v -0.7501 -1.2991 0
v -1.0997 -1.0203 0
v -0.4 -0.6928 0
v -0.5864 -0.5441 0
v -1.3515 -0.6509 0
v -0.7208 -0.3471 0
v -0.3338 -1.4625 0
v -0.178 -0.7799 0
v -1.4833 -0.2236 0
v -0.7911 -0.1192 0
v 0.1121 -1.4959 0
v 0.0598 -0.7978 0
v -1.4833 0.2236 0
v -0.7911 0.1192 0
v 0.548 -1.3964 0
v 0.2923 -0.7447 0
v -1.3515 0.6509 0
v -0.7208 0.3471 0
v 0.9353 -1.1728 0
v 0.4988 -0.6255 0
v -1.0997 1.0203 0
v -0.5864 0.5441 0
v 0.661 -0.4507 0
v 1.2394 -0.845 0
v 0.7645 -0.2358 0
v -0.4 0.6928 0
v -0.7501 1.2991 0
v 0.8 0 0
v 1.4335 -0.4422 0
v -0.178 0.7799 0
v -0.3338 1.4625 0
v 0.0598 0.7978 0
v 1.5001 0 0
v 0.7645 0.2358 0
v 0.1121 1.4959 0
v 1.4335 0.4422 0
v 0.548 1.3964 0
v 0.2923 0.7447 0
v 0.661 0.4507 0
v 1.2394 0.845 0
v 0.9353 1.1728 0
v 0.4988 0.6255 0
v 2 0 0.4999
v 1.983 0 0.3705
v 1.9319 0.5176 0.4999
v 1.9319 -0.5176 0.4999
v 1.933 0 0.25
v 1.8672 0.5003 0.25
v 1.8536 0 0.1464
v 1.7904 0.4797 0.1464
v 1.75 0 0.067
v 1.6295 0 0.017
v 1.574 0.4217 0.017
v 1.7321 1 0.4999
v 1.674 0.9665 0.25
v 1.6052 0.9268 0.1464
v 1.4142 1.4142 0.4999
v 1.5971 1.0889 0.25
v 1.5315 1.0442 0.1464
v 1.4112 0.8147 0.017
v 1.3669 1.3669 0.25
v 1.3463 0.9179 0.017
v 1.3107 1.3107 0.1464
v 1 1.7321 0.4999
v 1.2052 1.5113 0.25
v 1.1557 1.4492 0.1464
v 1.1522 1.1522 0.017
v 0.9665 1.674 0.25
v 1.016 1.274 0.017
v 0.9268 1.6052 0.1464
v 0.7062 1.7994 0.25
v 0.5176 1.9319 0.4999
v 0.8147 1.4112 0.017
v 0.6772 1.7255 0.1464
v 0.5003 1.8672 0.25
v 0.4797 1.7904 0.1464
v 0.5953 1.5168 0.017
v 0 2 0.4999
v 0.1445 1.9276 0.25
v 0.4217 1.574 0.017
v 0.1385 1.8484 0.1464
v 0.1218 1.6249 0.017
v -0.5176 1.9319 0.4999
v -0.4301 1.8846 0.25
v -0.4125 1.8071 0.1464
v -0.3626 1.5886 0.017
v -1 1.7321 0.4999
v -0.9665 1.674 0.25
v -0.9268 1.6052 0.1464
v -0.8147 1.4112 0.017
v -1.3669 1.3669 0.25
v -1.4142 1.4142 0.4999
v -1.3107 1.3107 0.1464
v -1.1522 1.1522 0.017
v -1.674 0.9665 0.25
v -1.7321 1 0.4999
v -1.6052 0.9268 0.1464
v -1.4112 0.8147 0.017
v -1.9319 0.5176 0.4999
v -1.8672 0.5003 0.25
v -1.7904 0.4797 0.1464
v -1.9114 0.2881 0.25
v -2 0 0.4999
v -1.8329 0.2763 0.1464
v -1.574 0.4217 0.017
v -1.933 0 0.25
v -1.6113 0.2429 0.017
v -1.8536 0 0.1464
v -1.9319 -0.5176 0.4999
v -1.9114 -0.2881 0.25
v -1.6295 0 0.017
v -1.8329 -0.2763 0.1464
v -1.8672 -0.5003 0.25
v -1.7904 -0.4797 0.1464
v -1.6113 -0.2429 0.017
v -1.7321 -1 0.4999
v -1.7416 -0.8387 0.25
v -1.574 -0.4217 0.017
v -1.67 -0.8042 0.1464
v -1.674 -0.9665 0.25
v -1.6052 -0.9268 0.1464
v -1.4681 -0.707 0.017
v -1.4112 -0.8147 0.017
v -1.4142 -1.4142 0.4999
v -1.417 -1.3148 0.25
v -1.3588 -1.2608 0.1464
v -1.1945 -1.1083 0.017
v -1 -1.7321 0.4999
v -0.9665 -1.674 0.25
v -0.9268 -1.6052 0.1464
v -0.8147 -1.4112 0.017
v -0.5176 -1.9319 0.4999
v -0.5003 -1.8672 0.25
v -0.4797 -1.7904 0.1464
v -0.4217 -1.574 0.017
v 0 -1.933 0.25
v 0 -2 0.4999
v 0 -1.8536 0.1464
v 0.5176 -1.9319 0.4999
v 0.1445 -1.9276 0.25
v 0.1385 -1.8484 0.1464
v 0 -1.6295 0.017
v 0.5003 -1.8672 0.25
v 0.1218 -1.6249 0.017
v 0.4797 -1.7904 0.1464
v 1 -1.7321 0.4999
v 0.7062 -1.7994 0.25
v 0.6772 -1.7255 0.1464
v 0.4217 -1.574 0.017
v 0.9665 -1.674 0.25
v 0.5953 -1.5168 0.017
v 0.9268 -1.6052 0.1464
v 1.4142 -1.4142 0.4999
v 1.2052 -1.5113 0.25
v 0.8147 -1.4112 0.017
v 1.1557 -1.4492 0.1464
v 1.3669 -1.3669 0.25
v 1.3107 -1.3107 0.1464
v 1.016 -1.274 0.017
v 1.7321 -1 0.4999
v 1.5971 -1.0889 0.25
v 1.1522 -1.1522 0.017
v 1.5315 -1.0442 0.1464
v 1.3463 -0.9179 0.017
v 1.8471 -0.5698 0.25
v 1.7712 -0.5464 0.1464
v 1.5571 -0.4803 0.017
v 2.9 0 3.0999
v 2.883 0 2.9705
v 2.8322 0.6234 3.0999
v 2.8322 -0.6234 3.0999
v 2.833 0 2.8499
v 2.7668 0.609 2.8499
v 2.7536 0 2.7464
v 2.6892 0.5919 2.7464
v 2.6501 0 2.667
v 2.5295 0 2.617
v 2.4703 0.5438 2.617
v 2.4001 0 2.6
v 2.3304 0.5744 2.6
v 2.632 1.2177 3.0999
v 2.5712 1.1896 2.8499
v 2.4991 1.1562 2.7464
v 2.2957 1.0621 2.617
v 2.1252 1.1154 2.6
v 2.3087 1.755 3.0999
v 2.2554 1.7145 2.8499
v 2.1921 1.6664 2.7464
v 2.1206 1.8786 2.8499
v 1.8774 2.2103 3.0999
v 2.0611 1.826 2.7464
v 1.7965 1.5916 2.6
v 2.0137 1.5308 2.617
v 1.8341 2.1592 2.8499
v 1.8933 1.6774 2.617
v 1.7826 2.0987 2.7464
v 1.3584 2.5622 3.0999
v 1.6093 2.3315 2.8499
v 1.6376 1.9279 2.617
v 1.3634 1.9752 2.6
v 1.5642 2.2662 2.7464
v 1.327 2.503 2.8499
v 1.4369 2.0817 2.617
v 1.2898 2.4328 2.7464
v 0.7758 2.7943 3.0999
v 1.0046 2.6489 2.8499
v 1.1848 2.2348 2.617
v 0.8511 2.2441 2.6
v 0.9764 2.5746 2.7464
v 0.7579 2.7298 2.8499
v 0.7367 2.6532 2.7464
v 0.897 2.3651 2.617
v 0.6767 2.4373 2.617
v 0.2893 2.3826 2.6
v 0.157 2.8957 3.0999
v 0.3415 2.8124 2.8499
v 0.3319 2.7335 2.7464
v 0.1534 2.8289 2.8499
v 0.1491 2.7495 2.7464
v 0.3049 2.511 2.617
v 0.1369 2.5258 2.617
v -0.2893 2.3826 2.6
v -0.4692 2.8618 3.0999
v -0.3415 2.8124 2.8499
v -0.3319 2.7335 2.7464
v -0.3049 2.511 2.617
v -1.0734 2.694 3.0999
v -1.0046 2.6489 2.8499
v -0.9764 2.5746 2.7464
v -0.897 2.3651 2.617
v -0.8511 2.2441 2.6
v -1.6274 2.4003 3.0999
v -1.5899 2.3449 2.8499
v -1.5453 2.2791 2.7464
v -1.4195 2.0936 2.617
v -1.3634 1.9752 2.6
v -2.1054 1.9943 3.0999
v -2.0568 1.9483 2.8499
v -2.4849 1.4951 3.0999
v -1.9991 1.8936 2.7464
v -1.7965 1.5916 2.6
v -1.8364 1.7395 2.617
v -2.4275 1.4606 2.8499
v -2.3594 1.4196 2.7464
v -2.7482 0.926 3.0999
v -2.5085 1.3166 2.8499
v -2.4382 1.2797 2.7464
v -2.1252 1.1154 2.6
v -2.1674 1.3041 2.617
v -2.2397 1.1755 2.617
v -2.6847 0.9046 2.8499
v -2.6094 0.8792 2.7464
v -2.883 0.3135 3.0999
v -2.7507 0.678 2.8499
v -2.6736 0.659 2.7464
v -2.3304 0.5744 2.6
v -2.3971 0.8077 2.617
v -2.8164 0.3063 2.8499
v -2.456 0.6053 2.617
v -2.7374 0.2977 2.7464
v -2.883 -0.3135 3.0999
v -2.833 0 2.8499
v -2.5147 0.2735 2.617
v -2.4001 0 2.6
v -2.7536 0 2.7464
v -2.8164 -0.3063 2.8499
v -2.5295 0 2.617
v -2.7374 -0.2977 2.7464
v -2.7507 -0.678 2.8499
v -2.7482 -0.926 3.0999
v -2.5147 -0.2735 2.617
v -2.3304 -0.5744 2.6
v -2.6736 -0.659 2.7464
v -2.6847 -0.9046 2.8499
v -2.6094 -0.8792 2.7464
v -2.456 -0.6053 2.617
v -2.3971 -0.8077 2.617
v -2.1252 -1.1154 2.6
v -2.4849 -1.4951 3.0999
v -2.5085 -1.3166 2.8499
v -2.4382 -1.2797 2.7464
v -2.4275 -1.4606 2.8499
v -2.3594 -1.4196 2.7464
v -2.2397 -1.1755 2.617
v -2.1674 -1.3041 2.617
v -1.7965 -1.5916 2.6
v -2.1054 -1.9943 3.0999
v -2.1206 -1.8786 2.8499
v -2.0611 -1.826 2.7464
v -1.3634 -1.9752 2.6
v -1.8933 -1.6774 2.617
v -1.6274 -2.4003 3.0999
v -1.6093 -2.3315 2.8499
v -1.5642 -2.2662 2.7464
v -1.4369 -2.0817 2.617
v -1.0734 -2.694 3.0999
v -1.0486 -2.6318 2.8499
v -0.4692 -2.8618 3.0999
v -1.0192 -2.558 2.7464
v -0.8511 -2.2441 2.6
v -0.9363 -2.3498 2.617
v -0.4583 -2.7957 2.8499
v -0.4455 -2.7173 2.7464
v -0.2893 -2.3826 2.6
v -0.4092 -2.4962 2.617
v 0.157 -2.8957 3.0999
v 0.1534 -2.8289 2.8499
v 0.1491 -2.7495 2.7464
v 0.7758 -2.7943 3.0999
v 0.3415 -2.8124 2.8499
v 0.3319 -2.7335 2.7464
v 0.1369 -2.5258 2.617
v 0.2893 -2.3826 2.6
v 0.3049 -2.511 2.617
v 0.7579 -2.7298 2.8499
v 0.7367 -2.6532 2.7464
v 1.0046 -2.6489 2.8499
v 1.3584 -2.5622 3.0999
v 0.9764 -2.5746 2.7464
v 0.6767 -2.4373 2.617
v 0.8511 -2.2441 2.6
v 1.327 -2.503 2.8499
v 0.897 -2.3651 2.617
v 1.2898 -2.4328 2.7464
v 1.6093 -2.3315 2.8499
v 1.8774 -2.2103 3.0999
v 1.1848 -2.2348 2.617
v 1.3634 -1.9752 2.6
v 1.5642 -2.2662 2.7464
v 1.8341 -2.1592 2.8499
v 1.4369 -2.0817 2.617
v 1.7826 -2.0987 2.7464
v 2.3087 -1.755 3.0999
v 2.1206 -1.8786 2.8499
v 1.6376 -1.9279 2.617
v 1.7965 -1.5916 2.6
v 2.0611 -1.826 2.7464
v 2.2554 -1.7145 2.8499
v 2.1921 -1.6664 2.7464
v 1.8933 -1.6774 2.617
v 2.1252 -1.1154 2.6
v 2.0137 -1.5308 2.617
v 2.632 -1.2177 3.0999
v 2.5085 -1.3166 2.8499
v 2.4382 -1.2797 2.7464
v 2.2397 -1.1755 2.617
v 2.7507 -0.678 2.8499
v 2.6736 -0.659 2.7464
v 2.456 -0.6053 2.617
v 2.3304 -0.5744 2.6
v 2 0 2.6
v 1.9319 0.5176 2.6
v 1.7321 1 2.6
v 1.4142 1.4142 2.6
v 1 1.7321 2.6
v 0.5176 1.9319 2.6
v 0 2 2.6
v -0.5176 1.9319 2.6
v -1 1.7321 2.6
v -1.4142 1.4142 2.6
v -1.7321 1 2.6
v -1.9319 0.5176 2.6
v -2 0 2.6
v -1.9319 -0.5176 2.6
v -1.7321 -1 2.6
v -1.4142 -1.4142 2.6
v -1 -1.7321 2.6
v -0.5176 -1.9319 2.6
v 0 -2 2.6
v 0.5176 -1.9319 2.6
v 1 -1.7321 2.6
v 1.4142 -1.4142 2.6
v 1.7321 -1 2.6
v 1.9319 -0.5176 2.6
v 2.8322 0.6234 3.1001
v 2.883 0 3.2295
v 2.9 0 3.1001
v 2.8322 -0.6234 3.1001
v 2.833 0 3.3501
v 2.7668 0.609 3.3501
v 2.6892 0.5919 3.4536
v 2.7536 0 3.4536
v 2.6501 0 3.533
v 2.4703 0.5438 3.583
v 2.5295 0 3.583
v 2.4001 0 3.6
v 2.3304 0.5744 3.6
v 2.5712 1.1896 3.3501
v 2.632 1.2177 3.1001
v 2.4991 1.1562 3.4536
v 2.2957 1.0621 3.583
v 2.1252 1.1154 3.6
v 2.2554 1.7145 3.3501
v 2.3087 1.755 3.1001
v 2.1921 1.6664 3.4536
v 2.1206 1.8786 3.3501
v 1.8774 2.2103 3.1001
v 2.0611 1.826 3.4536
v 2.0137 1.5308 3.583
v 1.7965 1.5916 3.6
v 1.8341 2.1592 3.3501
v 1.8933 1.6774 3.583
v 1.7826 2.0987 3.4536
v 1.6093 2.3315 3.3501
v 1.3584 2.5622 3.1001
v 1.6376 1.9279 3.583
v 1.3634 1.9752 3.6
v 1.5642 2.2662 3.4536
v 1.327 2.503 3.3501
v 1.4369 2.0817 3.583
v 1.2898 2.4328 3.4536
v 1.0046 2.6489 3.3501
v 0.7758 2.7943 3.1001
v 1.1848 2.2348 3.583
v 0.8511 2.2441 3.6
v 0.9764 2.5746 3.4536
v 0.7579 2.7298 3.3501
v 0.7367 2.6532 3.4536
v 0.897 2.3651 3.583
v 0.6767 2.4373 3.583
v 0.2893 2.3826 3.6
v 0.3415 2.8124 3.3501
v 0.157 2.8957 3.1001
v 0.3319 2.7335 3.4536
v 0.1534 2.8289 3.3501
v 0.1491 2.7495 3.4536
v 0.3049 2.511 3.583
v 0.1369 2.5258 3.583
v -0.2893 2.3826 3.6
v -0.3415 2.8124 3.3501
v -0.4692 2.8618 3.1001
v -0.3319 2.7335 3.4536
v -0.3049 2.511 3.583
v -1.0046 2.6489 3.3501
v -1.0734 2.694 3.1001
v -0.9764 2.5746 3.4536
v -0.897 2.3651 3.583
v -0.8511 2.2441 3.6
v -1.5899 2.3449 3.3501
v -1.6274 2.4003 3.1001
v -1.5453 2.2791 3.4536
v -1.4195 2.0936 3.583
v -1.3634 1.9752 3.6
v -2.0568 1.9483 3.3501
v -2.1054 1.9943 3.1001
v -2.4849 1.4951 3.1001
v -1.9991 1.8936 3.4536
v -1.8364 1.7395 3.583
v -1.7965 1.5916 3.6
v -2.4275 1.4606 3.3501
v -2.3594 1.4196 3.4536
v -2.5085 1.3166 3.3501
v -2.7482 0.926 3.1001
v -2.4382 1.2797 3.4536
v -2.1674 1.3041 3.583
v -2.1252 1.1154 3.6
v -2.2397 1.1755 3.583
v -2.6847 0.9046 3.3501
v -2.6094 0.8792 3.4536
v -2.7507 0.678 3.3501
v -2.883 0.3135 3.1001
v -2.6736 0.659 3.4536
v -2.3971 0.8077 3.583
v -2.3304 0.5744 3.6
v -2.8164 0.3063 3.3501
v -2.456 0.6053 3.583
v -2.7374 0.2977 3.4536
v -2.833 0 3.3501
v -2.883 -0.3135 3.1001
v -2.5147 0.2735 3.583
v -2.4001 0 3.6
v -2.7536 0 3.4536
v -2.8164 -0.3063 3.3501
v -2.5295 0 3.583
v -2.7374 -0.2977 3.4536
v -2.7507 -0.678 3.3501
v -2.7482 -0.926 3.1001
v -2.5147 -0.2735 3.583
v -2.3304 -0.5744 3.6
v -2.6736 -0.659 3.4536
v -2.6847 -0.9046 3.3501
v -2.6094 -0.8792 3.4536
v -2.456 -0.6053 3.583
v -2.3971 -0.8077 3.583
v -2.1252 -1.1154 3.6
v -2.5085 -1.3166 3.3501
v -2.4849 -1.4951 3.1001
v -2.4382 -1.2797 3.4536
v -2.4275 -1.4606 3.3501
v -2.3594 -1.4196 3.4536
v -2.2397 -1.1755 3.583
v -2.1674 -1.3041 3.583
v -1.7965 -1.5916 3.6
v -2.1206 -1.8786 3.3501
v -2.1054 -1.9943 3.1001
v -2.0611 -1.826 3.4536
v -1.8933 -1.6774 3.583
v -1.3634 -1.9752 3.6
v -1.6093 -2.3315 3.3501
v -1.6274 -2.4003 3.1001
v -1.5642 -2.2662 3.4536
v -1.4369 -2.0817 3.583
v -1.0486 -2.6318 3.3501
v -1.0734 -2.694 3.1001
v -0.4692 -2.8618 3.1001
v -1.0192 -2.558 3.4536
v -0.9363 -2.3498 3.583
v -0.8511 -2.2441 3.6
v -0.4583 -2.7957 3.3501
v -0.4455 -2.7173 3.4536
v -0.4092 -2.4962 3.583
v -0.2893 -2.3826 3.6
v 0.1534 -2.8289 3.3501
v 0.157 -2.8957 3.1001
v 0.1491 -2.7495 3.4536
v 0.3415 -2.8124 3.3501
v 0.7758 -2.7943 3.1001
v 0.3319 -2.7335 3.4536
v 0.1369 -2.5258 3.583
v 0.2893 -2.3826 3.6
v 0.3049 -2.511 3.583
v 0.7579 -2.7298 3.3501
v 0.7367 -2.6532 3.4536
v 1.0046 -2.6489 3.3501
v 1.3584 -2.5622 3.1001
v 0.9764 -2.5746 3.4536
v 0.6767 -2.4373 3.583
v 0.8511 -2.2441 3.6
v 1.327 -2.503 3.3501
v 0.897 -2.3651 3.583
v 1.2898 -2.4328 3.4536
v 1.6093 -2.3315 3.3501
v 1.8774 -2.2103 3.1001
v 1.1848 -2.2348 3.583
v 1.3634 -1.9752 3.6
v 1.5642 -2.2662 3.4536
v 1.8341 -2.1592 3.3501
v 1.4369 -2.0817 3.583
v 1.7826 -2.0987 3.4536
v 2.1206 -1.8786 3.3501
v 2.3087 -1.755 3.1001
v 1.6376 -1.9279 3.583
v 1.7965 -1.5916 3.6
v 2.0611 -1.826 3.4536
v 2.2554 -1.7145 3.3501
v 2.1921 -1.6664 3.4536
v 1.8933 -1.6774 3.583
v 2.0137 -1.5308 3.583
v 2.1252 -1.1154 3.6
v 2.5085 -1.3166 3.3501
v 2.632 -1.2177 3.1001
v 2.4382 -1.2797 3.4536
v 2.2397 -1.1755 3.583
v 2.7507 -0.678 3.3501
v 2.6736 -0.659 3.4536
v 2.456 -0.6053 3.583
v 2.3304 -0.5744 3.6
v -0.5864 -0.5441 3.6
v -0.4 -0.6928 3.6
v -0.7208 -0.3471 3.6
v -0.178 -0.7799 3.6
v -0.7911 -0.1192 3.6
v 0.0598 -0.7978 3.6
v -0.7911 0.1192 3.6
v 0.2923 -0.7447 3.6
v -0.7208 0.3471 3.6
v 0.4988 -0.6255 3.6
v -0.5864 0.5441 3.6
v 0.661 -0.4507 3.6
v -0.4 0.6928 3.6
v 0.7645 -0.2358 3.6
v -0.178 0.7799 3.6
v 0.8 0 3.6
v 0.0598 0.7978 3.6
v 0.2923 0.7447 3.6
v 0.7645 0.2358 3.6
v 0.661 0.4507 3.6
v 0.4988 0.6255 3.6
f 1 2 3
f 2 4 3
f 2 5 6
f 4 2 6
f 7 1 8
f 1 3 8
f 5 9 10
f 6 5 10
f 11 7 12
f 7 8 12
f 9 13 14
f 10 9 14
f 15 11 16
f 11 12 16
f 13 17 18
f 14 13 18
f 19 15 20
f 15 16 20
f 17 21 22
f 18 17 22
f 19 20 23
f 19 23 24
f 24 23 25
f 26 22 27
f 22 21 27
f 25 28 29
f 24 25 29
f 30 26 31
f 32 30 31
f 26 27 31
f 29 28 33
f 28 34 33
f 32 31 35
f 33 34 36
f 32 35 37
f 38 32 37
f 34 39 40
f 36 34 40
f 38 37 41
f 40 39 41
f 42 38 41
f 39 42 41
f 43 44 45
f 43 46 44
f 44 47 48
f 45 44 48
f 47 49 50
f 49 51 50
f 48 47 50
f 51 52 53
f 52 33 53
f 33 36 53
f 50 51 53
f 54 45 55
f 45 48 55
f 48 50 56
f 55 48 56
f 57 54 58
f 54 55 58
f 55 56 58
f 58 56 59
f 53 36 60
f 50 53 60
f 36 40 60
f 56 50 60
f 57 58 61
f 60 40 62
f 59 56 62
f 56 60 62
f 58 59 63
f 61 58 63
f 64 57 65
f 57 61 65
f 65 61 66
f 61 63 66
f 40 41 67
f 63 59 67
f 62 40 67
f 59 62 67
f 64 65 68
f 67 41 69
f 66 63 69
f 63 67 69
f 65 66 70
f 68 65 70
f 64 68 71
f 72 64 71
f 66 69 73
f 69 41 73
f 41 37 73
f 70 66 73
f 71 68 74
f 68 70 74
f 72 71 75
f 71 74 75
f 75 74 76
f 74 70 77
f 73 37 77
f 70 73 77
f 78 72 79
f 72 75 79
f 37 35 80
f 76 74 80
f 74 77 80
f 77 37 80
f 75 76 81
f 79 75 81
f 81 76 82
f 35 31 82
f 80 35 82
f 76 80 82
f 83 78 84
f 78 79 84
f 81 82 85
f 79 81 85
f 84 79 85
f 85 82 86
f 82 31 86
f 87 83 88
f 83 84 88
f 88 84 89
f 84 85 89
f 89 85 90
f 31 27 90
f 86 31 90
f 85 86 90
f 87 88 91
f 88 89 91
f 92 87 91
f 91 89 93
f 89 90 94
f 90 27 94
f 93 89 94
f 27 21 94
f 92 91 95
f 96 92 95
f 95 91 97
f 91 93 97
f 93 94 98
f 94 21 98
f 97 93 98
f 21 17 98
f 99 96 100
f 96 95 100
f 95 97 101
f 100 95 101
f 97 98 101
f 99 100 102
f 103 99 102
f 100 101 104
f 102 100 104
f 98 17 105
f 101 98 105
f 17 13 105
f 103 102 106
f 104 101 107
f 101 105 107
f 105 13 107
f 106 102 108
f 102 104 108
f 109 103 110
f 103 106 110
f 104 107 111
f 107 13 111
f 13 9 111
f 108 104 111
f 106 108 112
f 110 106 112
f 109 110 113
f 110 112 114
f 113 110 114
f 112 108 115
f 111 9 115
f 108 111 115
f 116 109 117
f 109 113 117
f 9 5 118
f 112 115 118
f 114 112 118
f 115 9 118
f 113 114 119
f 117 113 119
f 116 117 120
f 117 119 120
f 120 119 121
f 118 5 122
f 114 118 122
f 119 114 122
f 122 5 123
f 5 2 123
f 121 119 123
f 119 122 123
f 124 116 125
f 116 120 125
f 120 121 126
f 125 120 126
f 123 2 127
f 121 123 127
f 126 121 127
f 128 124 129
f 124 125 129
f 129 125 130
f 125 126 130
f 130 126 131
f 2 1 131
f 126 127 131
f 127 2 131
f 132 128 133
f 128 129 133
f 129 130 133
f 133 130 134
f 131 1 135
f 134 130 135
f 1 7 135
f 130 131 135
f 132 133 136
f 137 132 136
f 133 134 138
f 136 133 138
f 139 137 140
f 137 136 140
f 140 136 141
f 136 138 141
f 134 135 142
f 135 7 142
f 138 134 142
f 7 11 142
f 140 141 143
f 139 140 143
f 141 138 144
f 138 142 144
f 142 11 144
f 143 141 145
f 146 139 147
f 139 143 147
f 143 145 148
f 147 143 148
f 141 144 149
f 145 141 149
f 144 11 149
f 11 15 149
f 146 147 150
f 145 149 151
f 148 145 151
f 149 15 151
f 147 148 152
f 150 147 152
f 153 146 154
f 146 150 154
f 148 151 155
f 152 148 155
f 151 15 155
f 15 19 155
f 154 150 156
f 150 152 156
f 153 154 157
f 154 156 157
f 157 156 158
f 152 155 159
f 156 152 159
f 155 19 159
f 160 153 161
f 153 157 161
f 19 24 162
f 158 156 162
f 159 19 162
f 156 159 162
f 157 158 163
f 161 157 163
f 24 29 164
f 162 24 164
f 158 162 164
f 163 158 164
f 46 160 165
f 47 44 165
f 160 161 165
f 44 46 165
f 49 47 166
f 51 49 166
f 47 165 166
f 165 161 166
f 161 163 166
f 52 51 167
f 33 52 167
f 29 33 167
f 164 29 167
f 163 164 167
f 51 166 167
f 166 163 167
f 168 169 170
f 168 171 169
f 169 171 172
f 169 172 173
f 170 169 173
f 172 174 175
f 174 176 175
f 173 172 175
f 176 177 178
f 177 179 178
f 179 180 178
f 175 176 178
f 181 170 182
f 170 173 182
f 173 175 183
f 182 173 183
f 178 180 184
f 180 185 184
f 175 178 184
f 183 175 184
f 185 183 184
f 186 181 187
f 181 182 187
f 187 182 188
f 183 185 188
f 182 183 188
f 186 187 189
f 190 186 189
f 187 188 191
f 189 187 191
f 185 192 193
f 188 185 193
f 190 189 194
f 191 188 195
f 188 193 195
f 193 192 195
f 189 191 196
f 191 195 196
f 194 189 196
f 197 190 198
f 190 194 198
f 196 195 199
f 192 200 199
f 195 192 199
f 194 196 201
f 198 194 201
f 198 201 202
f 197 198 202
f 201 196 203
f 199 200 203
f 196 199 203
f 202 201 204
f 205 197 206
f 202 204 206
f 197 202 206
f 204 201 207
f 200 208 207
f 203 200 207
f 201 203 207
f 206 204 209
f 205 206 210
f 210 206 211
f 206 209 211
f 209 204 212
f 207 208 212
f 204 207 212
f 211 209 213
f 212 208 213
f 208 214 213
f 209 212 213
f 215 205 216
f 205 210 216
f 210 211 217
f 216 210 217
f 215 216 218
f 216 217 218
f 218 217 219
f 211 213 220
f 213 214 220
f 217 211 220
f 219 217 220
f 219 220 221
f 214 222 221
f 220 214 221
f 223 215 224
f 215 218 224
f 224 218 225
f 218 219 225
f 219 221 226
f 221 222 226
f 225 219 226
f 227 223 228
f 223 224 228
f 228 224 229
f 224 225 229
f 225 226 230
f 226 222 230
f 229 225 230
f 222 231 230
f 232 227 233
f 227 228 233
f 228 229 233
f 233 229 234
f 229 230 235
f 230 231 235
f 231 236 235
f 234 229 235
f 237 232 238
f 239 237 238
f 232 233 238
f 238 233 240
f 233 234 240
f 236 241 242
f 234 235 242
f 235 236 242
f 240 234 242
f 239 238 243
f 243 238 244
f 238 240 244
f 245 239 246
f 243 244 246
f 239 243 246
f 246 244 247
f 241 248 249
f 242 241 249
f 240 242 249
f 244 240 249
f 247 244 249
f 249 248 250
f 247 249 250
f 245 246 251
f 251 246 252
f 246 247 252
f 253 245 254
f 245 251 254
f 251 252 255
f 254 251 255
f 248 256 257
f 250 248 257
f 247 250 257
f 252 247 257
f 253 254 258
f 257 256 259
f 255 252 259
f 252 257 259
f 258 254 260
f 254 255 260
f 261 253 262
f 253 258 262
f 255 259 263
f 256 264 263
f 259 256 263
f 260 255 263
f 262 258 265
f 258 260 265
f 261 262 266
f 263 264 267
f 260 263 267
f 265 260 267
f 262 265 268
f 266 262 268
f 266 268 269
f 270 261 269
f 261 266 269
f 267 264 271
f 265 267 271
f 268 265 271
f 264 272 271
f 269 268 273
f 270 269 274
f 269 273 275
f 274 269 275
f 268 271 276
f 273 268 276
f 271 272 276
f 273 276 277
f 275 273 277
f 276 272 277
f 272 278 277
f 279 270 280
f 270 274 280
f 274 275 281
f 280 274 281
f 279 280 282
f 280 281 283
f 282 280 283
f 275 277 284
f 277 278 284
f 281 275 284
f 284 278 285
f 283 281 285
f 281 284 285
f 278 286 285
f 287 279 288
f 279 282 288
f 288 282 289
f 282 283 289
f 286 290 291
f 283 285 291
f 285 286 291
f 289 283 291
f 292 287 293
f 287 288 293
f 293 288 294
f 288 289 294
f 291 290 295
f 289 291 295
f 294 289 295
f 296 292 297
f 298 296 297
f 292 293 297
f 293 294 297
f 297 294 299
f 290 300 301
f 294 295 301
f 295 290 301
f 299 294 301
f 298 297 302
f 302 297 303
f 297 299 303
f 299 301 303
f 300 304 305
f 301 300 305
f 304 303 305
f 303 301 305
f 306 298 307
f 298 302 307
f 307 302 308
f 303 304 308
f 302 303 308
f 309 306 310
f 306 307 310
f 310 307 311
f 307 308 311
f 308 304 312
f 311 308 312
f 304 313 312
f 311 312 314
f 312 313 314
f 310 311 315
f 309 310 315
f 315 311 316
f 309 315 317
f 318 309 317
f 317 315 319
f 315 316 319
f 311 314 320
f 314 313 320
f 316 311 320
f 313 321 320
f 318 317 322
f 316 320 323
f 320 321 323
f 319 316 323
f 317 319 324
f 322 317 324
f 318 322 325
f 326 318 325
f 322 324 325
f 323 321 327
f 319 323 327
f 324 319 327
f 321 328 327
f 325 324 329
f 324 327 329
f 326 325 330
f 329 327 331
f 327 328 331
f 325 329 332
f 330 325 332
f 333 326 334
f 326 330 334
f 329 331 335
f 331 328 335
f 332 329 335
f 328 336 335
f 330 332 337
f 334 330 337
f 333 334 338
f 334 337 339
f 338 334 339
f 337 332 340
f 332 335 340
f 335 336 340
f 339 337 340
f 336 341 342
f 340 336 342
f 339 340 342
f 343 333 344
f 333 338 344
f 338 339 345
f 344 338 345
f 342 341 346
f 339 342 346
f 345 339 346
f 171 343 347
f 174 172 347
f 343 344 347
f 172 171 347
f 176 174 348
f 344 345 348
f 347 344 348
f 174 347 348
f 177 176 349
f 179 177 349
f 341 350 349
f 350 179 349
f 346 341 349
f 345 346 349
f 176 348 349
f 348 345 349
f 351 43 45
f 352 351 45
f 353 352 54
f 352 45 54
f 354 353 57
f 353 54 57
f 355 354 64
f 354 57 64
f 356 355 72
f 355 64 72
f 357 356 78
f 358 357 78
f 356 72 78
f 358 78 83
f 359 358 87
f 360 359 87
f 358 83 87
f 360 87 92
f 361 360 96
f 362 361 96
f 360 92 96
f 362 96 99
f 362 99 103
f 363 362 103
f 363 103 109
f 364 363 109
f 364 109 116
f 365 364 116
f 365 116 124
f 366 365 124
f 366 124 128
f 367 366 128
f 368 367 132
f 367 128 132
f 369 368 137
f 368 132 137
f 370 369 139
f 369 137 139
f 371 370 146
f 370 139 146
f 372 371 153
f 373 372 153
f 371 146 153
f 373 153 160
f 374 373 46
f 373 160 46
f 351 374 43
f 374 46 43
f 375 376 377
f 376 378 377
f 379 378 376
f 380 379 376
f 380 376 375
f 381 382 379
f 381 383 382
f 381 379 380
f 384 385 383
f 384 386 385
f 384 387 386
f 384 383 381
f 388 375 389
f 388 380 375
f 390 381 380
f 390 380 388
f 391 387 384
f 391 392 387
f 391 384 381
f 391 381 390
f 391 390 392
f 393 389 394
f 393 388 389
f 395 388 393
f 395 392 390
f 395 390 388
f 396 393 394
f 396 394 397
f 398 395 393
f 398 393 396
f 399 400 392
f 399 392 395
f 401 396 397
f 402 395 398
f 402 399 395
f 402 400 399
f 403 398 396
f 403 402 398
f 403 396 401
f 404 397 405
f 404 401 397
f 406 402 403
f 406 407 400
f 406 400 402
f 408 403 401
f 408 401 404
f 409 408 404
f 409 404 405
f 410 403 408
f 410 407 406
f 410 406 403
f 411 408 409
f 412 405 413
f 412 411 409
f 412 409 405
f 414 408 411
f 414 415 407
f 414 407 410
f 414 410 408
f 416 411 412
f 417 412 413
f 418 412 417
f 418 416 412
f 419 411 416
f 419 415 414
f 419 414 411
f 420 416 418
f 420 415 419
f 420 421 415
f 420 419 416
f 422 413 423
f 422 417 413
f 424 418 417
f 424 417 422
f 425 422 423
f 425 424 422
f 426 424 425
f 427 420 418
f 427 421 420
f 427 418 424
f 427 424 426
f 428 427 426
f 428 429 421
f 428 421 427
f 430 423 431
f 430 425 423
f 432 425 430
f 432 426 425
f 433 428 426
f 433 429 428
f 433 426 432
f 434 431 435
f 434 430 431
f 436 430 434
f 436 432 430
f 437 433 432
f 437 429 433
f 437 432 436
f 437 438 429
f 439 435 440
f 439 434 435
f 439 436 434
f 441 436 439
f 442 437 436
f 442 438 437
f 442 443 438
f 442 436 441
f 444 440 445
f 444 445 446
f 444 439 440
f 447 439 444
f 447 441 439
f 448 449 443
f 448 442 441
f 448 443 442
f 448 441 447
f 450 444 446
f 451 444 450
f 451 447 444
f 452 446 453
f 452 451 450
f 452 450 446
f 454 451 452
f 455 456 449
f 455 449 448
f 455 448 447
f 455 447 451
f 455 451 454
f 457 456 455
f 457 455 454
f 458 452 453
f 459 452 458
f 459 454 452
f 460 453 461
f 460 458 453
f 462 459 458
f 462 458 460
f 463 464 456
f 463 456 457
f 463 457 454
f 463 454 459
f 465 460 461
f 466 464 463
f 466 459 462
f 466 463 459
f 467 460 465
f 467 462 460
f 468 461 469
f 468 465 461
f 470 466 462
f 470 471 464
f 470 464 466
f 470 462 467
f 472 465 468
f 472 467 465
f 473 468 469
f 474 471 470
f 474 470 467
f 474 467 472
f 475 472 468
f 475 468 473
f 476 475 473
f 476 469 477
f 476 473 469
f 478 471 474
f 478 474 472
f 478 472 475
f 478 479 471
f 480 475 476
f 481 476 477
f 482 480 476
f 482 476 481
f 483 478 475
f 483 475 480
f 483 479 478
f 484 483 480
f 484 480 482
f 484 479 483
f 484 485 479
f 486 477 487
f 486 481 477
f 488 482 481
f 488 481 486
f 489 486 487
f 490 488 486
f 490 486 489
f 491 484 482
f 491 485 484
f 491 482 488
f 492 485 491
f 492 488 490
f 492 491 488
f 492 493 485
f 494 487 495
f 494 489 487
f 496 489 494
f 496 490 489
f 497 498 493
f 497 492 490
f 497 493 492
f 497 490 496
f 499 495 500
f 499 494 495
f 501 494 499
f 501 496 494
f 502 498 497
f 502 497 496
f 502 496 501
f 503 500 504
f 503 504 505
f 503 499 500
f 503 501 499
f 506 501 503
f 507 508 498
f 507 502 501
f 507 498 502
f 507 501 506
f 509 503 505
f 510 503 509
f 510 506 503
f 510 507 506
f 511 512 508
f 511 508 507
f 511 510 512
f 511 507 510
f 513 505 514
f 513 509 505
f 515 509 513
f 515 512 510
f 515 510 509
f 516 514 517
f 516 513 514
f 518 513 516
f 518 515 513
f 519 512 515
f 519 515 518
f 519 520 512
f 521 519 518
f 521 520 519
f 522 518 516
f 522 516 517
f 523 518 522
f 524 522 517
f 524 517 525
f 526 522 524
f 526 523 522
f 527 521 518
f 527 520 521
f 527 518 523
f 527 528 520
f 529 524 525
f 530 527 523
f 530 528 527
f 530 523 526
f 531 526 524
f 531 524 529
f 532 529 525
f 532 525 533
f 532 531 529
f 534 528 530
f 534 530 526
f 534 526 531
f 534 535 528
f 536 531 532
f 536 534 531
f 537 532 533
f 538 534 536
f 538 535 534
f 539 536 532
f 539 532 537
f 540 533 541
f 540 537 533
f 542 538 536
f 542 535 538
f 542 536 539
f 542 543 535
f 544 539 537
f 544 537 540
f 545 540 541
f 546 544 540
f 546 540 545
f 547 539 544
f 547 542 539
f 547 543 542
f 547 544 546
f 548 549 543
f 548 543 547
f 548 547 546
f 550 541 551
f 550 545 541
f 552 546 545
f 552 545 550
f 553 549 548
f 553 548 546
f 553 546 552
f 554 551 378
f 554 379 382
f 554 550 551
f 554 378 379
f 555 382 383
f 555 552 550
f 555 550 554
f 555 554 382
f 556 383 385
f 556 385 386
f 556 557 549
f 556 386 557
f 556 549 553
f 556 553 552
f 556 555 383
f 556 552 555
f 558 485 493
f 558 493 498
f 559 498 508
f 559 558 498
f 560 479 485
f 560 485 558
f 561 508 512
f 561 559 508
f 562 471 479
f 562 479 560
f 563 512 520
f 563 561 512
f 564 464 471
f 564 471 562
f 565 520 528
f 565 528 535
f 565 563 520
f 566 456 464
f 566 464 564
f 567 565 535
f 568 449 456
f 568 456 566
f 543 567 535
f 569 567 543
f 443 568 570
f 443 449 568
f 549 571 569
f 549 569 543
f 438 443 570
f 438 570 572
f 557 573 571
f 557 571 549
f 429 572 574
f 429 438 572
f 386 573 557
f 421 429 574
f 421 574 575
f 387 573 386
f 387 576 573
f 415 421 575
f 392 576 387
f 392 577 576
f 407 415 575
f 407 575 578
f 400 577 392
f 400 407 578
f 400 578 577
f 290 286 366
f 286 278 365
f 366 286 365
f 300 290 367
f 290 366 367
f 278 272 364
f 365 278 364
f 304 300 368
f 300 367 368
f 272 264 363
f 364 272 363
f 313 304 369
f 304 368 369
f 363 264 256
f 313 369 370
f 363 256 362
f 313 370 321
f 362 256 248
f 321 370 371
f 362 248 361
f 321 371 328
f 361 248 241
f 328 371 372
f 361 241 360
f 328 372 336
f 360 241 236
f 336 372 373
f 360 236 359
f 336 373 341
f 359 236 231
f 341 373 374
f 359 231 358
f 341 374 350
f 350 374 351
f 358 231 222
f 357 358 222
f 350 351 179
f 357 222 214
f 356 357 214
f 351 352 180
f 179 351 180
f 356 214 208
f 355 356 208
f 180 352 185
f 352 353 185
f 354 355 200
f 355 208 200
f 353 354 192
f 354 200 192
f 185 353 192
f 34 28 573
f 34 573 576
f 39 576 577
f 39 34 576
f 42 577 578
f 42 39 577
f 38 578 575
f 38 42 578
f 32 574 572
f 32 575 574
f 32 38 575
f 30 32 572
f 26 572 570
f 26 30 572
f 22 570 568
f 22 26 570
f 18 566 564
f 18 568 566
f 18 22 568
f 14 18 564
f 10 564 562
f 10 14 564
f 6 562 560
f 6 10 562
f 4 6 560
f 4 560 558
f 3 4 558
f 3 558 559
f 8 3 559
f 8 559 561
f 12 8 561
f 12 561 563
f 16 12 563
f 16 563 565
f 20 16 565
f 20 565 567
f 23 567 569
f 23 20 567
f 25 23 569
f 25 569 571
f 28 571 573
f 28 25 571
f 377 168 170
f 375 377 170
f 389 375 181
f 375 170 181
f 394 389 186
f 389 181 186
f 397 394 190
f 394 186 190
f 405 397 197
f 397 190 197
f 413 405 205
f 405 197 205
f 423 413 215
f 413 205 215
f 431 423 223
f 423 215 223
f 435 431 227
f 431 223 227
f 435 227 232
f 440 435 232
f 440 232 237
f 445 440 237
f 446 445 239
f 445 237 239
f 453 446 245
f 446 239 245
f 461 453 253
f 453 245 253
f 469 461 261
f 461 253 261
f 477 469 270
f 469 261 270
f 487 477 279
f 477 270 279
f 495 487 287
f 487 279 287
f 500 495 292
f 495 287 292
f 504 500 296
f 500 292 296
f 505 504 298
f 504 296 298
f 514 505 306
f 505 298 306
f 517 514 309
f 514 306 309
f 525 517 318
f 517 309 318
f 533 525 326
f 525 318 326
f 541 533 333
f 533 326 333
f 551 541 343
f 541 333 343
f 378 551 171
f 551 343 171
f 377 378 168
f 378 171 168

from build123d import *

# Parameters (mm, degrees)
SKETCH_1_R               = 2
EXTRUDE_1_DEPTH          = 2.6
SKETCH_2_R               = 2.9
EXTRUDE_2_DEPTH          = 1
CUT_EXTRUDE_1_DEPTH      = 6.45710546
CUT_EXTRUDE_1_DEPTH_BACK = 6.45710546
SKETCH_3_R               = 0.8
FILLET_2_R               = 0.5


with BuildPart() as part:
    # 草图1 → 凸台-拉伸1 (new body)
    with BuildSketch(Plane.XY):
        Circle(SKETCH_1_R)
    extrude(amount=EXTRUDE_1_DEPTH)

    # 草图2 → 凸台-拉伸2 (add)
    with BuildSketch(Plane.XY.offset(2.6)):
        Circle(SKETCH_2_R)
    extrude(amount=EXTRUDE_2_DEPTH)

    # 草图3 → 切除-拉伸1 (cut, two sides: drawn at the far end of the back side and taken through both)
    with BuildSketch(Plane.XY.offset(3.6).offset(-CUT_EXTRUDE_1_DEPTH_BACK)):
        Circle(SKETCH_3_R)
    extrude(amount=CUT_EXTRUDE_1_DEPTH + CUT_EXTRUDE_1_DEPTH_BACK, mode=Mode.SUBTRACT)

    # 圆角2
    fillet_2_edges = [part.edges().sort_by_distance(p)[0] for p in [
        (-2, 0, 0),
        (-2.9, 0, 2.6),
        (-2.9, 0, 3.6),
    ]]
    fillet(fillet_2_edges, radius=FILLET_2_R - 0.0001)  # a hair under: the kernel refuses the full size


solid = part.part
